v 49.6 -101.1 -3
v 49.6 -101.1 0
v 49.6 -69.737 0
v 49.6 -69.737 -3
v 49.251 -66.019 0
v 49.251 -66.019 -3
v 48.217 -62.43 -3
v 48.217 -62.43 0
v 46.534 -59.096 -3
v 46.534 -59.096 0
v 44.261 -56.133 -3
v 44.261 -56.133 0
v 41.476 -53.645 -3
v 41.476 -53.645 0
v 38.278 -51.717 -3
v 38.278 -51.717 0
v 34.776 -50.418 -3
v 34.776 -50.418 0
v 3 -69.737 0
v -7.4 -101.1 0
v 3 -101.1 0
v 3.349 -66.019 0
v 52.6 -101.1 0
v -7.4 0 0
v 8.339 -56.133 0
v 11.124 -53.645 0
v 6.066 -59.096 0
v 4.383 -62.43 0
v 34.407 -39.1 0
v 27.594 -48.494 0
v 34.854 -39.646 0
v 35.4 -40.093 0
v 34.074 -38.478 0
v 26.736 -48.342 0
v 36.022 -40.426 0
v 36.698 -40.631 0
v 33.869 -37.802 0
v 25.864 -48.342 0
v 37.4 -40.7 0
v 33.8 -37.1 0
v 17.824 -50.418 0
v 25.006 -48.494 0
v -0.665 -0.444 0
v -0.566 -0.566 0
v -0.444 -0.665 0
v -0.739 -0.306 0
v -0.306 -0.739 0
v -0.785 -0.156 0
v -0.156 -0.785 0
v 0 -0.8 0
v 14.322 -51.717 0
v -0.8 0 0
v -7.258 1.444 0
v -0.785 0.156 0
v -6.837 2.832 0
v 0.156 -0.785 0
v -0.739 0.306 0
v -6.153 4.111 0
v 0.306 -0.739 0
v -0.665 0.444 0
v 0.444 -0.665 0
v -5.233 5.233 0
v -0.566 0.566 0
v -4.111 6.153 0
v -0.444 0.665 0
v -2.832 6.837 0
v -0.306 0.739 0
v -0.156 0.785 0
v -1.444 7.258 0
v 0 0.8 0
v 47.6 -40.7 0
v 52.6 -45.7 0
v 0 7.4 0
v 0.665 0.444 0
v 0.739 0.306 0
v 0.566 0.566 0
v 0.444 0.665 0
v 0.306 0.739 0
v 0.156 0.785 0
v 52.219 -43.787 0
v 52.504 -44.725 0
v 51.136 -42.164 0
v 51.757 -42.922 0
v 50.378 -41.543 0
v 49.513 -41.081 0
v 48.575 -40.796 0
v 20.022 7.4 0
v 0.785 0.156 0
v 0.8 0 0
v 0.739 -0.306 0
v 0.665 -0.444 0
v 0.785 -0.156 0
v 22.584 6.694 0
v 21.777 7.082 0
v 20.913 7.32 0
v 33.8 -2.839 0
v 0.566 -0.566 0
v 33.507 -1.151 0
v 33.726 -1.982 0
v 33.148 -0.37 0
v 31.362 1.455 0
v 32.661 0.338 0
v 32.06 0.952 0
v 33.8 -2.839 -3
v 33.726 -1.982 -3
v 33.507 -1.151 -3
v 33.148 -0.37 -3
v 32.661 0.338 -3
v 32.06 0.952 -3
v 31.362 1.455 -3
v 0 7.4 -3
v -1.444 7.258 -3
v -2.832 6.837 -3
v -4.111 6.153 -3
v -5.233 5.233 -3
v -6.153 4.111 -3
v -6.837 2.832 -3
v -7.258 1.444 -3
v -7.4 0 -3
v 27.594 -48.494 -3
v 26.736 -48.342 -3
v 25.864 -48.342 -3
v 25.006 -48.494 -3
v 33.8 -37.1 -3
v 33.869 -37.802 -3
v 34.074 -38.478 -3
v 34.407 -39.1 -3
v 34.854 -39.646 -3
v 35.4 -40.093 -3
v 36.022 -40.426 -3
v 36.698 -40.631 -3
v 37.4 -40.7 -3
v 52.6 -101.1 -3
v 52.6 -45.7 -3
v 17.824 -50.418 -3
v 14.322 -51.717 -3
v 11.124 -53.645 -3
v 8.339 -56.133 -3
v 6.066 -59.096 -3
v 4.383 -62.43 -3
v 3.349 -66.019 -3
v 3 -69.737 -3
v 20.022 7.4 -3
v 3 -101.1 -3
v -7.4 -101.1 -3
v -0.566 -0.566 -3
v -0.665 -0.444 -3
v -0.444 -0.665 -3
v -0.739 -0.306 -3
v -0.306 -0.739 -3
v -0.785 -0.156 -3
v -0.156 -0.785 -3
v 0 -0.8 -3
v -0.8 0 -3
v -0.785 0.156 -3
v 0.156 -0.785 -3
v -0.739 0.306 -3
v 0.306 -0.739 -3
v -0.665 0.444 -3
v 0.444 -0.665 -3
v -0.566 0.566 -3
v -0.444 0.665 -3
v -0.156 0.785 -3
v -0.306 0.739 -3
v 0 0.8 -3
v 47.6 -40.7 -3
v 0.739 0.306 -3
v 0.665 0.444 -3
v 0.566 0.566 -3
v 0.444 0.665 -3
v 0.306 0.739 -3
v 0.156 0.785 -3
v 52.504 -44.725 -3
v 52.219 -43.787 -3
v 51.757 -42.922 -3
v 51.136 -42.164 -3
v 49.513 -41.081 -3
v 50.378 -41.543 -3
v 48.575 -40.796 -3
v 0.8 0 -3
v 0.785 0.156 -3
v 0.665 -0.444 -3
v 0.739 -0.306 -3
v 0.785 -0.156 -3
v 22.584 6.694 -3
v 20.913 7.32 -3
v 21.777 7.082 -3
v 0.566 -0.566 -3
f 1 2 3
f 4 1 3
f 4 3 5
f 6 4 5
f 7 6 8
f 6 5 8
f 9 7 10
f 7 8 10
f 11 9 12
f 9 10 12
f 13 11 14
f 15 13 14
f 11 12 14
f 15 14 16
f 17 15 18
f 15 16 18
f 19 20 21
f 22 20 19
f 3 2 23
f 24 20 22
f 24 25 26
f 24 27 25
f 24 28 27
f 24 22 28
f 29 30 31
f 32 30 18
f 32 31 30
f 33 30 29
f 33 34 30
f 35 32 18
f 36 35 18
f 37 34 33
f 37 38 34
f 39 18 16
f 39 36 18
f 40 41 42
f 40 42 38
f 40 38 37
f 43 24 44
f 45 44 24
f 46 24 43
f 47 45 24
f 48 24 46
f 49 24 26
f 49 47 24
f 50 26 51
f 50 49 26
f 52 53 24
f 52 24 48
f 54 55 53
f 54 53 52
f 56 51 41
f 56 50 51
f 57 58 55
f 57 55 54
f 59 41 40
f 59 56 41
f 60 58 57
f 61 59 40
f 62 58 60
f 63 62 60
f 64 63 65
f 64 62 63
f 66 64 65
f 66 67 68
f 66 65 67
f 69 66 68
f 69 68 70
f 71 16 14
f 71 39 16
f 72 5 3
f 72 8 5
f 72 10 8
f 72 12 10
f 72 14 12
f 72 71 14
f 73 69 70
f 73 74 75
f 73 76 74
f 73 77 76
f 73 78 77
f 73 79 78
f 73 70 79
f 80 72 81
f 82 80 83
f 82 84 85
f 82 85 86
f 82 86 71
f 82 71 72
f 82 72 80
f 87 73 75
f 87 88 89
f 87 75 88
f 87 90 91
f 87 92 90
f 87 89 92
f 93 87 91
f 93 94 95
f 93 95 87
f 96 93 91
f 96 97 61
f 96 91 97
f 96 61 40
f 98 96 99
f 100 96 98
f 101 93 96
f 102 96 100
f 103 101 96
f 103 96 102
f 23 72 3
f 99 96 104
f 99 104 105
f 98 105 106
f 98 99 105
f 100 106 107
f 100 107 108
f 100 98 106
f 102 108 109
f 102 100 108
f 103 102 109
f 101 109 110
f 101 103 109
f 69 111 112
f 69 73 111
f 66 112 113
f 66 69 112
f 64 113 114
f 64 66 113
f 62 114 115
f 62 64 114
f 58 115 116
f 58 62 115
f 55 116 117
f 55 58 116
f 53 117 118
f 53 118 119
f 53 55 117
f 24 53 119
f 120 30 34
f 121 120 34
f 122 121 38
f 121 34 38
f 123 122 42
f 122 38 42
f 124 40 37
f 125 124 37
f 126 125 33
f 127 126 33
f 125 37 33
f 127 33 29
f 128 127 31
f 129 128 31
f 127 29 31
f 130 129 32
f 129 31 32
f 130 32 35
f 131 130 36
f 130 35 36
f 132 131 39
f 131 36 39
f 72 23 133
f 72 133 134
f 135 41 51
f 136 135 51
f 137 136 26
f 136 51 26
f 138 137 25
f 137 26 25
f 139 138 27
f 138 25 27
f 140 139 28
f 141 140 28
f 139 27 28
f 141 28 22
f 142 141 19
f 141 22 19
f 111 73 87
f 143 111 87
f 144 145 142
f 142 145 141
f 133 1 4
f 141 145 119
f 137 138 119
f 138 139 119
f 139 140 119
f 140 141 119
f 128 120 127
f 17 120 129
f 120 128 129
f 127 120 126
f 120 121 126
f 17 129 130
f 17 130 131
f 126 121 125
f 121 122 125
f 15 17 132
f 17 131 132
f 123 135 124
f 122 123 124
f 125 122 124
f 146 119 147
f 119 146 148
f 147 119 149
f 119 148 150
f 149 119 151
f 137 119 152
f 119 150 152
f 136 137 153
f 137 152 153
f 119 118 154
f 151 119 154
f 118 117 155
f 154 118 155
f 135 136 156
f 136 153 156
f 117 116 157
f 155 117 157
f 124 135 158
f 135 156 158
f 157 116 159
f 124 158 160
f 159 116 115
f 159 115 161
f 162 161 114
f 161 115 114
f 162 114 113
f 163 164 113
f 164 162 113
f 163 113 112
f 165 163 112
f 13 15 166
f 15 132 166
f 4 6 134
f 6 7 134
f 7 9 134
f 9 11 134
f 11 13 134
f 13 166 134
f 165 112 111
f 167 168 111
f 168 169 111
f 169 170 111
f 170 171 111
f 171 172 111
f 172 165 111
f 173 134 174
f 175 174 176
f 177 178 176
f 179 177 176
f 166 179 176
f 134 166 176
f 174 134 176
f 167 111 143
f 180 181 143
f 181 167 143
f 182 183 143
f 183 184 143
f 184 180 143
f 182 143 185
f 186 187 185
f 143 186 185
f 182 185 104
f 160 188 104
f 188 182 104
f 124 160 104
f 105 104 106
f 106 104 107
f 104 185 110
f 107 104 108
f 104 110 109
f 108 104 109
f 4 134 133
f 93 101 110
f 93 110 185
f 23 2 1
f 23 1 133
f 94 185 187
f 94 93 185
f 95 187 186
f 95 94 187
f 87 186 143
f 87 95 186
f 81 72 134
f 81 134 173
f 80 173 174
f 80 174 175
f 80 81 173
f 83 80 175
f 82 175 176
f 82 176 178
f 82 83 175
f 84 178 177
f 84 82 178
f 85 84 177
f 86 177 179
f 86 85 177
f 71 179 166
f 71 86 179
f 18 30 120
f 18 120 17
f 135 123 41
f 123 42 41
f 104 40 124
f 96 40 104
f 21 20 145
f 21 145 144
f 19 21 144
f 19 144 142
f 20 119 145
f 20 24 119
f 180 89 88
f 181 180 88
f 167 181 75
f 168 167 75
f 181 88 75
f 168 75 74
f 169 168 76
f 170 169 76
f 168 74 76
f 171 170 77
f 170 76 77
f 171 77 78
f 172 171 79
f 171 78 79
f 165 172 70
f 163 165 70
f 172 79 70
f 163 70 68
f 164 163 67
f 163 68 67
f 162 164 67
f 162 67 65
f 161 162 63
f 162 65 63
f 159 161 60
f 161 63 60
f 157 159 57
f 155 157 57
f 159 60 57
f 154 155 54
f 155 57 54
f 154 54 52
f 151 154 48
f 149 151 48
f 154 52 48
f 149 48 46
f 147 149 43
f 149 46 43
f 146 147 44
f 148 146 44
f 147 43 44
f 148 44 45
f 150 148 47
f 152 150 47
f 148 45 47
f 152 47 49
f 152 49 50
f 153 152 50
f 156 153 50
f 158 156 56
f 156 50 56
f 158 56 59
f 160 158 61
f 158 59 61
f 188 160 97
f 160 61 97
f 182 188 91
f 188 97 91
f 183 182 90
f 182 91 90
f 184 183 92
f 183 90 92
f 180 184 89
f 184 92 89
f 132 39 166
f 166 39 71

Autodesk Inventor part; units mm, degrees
ref_plane "YZ Plane" through (0, 0, 0) normal (1, 0, 0) x (0, 1, 0)
ref_plane "XZ Plane" through (0, 0, 0) normal (0, 1, 0) x (-1, 0, 0)
ref_plane "XY Plane" through (0, 0, 0) normal (0, 0, 1) x (1, 0, 0)
sketch "Esboço1" plane through (0, 0, 0) normal (0, 0, 1) x (1, 0, 0)
  circle A0 centre (0, 0) radius 0.8 projected
  circle A1 centre (37.4, -29.1) radius 15.2 projected
  line L0 (50.6, -101.1) -> (52.6, -101.1)
  line L1 (52.6, -101.1) -> (52.6, -45.7)
  line L2 (5.4, 7.4) -> (20.0215, 7.4)
  arc A2 (0, 7.4) -> (-7.2767, -1.3455) centre (0, 0) ccw
  line L3 (33.8, -29.1) -> (33.8, -2.8388)
  line L4 (31.3623, 1.4548) -> (22.5838, 6.6936)
  arc A3 (33.8, -37.1) -> (41, -37.1) centre (37.4, -37.1) ccw projected
  line L5 (33.8, -37.1) -> (33.8, -29.1)
  line L6 (37.4, -40.7) -> (47.6, -40.7)
  line L7 (0, 7.4) -> (7.6354, 7.4)
  line L8 (27.5941, -48.4938) -> (34.7764, -50.4183)
  line L9 (52.6, -101.1) -> (49.6, -101.1)
  line L10 (49.6, -101.1) -> (49.6, -69.7368)
  line L11 (52.6, -54.3903) -> (52.6, -101.1)
  arc A4 (49.6, -69.7368) -> (34.7764, -50.4183) centre (29.6, -69.7368) ccw
  arc A5 (52.6, -45.7) -> (47.6, -40.7) centre (47.6, -45.7) ccw
  arc A6 (22.5838, 6.6936) -> (20.0215, 7.4) centre (20.0215, 2.4) ccw
  arc A7 (33.8, -2.8388) -> (31.3623, 1.4548) centre (28.8, -2.8388) ccw
  line L12 (2, -101.1) -> (0, -101.1)
  line L13 (52.6, -51.1) -> (1.2194, -51.1) construction
  line L14 (25.0059, -48.4938) -> (17.8236, -50.4183)
  line L15 (0, -101.1) -> (3, -101.1)
  line L16 (3, -101.1) -> (3, -69.7368)
  arc A8 (17.8236, -50.4183) -> (3, -69.7368) centre (23, -69.7368) ccw
  circle A9 centre (0, 0) radius 7.4
  arc A10 (27.5941, -48.4938) -> (25.0059, -48.4938) centre (26.3, -53.3234) ccw
  line L17 (-7.4, 0) -> (-7.4, -101.1)
  line L18 (-7.4, -101.1) -> (0, -101.1)
  point P0 (21.4, 7.4)
  point P1 (49.6, -54.3903)
  point P2 (3, -54.3903)
  point P3 (49.5452, -41.9185)
  dimension "d7" = 20
  dimension "d9" = 5
  dimension "d11" = 5
extrude "Extrusão1" add sketch "Esboço1" against normal blind 3 contours L3 L5 A3 L6 A1 | A1 L6 A5 L1 L0 L9 L10 A4 L8 A10 L14 A8 L16 L15 L12 L18 L17 A2 A9 L7 L2 A6 L4 A7 L3 | A9 A2 picked at (30.2417, -33.5073)
properties part number "guarra"
